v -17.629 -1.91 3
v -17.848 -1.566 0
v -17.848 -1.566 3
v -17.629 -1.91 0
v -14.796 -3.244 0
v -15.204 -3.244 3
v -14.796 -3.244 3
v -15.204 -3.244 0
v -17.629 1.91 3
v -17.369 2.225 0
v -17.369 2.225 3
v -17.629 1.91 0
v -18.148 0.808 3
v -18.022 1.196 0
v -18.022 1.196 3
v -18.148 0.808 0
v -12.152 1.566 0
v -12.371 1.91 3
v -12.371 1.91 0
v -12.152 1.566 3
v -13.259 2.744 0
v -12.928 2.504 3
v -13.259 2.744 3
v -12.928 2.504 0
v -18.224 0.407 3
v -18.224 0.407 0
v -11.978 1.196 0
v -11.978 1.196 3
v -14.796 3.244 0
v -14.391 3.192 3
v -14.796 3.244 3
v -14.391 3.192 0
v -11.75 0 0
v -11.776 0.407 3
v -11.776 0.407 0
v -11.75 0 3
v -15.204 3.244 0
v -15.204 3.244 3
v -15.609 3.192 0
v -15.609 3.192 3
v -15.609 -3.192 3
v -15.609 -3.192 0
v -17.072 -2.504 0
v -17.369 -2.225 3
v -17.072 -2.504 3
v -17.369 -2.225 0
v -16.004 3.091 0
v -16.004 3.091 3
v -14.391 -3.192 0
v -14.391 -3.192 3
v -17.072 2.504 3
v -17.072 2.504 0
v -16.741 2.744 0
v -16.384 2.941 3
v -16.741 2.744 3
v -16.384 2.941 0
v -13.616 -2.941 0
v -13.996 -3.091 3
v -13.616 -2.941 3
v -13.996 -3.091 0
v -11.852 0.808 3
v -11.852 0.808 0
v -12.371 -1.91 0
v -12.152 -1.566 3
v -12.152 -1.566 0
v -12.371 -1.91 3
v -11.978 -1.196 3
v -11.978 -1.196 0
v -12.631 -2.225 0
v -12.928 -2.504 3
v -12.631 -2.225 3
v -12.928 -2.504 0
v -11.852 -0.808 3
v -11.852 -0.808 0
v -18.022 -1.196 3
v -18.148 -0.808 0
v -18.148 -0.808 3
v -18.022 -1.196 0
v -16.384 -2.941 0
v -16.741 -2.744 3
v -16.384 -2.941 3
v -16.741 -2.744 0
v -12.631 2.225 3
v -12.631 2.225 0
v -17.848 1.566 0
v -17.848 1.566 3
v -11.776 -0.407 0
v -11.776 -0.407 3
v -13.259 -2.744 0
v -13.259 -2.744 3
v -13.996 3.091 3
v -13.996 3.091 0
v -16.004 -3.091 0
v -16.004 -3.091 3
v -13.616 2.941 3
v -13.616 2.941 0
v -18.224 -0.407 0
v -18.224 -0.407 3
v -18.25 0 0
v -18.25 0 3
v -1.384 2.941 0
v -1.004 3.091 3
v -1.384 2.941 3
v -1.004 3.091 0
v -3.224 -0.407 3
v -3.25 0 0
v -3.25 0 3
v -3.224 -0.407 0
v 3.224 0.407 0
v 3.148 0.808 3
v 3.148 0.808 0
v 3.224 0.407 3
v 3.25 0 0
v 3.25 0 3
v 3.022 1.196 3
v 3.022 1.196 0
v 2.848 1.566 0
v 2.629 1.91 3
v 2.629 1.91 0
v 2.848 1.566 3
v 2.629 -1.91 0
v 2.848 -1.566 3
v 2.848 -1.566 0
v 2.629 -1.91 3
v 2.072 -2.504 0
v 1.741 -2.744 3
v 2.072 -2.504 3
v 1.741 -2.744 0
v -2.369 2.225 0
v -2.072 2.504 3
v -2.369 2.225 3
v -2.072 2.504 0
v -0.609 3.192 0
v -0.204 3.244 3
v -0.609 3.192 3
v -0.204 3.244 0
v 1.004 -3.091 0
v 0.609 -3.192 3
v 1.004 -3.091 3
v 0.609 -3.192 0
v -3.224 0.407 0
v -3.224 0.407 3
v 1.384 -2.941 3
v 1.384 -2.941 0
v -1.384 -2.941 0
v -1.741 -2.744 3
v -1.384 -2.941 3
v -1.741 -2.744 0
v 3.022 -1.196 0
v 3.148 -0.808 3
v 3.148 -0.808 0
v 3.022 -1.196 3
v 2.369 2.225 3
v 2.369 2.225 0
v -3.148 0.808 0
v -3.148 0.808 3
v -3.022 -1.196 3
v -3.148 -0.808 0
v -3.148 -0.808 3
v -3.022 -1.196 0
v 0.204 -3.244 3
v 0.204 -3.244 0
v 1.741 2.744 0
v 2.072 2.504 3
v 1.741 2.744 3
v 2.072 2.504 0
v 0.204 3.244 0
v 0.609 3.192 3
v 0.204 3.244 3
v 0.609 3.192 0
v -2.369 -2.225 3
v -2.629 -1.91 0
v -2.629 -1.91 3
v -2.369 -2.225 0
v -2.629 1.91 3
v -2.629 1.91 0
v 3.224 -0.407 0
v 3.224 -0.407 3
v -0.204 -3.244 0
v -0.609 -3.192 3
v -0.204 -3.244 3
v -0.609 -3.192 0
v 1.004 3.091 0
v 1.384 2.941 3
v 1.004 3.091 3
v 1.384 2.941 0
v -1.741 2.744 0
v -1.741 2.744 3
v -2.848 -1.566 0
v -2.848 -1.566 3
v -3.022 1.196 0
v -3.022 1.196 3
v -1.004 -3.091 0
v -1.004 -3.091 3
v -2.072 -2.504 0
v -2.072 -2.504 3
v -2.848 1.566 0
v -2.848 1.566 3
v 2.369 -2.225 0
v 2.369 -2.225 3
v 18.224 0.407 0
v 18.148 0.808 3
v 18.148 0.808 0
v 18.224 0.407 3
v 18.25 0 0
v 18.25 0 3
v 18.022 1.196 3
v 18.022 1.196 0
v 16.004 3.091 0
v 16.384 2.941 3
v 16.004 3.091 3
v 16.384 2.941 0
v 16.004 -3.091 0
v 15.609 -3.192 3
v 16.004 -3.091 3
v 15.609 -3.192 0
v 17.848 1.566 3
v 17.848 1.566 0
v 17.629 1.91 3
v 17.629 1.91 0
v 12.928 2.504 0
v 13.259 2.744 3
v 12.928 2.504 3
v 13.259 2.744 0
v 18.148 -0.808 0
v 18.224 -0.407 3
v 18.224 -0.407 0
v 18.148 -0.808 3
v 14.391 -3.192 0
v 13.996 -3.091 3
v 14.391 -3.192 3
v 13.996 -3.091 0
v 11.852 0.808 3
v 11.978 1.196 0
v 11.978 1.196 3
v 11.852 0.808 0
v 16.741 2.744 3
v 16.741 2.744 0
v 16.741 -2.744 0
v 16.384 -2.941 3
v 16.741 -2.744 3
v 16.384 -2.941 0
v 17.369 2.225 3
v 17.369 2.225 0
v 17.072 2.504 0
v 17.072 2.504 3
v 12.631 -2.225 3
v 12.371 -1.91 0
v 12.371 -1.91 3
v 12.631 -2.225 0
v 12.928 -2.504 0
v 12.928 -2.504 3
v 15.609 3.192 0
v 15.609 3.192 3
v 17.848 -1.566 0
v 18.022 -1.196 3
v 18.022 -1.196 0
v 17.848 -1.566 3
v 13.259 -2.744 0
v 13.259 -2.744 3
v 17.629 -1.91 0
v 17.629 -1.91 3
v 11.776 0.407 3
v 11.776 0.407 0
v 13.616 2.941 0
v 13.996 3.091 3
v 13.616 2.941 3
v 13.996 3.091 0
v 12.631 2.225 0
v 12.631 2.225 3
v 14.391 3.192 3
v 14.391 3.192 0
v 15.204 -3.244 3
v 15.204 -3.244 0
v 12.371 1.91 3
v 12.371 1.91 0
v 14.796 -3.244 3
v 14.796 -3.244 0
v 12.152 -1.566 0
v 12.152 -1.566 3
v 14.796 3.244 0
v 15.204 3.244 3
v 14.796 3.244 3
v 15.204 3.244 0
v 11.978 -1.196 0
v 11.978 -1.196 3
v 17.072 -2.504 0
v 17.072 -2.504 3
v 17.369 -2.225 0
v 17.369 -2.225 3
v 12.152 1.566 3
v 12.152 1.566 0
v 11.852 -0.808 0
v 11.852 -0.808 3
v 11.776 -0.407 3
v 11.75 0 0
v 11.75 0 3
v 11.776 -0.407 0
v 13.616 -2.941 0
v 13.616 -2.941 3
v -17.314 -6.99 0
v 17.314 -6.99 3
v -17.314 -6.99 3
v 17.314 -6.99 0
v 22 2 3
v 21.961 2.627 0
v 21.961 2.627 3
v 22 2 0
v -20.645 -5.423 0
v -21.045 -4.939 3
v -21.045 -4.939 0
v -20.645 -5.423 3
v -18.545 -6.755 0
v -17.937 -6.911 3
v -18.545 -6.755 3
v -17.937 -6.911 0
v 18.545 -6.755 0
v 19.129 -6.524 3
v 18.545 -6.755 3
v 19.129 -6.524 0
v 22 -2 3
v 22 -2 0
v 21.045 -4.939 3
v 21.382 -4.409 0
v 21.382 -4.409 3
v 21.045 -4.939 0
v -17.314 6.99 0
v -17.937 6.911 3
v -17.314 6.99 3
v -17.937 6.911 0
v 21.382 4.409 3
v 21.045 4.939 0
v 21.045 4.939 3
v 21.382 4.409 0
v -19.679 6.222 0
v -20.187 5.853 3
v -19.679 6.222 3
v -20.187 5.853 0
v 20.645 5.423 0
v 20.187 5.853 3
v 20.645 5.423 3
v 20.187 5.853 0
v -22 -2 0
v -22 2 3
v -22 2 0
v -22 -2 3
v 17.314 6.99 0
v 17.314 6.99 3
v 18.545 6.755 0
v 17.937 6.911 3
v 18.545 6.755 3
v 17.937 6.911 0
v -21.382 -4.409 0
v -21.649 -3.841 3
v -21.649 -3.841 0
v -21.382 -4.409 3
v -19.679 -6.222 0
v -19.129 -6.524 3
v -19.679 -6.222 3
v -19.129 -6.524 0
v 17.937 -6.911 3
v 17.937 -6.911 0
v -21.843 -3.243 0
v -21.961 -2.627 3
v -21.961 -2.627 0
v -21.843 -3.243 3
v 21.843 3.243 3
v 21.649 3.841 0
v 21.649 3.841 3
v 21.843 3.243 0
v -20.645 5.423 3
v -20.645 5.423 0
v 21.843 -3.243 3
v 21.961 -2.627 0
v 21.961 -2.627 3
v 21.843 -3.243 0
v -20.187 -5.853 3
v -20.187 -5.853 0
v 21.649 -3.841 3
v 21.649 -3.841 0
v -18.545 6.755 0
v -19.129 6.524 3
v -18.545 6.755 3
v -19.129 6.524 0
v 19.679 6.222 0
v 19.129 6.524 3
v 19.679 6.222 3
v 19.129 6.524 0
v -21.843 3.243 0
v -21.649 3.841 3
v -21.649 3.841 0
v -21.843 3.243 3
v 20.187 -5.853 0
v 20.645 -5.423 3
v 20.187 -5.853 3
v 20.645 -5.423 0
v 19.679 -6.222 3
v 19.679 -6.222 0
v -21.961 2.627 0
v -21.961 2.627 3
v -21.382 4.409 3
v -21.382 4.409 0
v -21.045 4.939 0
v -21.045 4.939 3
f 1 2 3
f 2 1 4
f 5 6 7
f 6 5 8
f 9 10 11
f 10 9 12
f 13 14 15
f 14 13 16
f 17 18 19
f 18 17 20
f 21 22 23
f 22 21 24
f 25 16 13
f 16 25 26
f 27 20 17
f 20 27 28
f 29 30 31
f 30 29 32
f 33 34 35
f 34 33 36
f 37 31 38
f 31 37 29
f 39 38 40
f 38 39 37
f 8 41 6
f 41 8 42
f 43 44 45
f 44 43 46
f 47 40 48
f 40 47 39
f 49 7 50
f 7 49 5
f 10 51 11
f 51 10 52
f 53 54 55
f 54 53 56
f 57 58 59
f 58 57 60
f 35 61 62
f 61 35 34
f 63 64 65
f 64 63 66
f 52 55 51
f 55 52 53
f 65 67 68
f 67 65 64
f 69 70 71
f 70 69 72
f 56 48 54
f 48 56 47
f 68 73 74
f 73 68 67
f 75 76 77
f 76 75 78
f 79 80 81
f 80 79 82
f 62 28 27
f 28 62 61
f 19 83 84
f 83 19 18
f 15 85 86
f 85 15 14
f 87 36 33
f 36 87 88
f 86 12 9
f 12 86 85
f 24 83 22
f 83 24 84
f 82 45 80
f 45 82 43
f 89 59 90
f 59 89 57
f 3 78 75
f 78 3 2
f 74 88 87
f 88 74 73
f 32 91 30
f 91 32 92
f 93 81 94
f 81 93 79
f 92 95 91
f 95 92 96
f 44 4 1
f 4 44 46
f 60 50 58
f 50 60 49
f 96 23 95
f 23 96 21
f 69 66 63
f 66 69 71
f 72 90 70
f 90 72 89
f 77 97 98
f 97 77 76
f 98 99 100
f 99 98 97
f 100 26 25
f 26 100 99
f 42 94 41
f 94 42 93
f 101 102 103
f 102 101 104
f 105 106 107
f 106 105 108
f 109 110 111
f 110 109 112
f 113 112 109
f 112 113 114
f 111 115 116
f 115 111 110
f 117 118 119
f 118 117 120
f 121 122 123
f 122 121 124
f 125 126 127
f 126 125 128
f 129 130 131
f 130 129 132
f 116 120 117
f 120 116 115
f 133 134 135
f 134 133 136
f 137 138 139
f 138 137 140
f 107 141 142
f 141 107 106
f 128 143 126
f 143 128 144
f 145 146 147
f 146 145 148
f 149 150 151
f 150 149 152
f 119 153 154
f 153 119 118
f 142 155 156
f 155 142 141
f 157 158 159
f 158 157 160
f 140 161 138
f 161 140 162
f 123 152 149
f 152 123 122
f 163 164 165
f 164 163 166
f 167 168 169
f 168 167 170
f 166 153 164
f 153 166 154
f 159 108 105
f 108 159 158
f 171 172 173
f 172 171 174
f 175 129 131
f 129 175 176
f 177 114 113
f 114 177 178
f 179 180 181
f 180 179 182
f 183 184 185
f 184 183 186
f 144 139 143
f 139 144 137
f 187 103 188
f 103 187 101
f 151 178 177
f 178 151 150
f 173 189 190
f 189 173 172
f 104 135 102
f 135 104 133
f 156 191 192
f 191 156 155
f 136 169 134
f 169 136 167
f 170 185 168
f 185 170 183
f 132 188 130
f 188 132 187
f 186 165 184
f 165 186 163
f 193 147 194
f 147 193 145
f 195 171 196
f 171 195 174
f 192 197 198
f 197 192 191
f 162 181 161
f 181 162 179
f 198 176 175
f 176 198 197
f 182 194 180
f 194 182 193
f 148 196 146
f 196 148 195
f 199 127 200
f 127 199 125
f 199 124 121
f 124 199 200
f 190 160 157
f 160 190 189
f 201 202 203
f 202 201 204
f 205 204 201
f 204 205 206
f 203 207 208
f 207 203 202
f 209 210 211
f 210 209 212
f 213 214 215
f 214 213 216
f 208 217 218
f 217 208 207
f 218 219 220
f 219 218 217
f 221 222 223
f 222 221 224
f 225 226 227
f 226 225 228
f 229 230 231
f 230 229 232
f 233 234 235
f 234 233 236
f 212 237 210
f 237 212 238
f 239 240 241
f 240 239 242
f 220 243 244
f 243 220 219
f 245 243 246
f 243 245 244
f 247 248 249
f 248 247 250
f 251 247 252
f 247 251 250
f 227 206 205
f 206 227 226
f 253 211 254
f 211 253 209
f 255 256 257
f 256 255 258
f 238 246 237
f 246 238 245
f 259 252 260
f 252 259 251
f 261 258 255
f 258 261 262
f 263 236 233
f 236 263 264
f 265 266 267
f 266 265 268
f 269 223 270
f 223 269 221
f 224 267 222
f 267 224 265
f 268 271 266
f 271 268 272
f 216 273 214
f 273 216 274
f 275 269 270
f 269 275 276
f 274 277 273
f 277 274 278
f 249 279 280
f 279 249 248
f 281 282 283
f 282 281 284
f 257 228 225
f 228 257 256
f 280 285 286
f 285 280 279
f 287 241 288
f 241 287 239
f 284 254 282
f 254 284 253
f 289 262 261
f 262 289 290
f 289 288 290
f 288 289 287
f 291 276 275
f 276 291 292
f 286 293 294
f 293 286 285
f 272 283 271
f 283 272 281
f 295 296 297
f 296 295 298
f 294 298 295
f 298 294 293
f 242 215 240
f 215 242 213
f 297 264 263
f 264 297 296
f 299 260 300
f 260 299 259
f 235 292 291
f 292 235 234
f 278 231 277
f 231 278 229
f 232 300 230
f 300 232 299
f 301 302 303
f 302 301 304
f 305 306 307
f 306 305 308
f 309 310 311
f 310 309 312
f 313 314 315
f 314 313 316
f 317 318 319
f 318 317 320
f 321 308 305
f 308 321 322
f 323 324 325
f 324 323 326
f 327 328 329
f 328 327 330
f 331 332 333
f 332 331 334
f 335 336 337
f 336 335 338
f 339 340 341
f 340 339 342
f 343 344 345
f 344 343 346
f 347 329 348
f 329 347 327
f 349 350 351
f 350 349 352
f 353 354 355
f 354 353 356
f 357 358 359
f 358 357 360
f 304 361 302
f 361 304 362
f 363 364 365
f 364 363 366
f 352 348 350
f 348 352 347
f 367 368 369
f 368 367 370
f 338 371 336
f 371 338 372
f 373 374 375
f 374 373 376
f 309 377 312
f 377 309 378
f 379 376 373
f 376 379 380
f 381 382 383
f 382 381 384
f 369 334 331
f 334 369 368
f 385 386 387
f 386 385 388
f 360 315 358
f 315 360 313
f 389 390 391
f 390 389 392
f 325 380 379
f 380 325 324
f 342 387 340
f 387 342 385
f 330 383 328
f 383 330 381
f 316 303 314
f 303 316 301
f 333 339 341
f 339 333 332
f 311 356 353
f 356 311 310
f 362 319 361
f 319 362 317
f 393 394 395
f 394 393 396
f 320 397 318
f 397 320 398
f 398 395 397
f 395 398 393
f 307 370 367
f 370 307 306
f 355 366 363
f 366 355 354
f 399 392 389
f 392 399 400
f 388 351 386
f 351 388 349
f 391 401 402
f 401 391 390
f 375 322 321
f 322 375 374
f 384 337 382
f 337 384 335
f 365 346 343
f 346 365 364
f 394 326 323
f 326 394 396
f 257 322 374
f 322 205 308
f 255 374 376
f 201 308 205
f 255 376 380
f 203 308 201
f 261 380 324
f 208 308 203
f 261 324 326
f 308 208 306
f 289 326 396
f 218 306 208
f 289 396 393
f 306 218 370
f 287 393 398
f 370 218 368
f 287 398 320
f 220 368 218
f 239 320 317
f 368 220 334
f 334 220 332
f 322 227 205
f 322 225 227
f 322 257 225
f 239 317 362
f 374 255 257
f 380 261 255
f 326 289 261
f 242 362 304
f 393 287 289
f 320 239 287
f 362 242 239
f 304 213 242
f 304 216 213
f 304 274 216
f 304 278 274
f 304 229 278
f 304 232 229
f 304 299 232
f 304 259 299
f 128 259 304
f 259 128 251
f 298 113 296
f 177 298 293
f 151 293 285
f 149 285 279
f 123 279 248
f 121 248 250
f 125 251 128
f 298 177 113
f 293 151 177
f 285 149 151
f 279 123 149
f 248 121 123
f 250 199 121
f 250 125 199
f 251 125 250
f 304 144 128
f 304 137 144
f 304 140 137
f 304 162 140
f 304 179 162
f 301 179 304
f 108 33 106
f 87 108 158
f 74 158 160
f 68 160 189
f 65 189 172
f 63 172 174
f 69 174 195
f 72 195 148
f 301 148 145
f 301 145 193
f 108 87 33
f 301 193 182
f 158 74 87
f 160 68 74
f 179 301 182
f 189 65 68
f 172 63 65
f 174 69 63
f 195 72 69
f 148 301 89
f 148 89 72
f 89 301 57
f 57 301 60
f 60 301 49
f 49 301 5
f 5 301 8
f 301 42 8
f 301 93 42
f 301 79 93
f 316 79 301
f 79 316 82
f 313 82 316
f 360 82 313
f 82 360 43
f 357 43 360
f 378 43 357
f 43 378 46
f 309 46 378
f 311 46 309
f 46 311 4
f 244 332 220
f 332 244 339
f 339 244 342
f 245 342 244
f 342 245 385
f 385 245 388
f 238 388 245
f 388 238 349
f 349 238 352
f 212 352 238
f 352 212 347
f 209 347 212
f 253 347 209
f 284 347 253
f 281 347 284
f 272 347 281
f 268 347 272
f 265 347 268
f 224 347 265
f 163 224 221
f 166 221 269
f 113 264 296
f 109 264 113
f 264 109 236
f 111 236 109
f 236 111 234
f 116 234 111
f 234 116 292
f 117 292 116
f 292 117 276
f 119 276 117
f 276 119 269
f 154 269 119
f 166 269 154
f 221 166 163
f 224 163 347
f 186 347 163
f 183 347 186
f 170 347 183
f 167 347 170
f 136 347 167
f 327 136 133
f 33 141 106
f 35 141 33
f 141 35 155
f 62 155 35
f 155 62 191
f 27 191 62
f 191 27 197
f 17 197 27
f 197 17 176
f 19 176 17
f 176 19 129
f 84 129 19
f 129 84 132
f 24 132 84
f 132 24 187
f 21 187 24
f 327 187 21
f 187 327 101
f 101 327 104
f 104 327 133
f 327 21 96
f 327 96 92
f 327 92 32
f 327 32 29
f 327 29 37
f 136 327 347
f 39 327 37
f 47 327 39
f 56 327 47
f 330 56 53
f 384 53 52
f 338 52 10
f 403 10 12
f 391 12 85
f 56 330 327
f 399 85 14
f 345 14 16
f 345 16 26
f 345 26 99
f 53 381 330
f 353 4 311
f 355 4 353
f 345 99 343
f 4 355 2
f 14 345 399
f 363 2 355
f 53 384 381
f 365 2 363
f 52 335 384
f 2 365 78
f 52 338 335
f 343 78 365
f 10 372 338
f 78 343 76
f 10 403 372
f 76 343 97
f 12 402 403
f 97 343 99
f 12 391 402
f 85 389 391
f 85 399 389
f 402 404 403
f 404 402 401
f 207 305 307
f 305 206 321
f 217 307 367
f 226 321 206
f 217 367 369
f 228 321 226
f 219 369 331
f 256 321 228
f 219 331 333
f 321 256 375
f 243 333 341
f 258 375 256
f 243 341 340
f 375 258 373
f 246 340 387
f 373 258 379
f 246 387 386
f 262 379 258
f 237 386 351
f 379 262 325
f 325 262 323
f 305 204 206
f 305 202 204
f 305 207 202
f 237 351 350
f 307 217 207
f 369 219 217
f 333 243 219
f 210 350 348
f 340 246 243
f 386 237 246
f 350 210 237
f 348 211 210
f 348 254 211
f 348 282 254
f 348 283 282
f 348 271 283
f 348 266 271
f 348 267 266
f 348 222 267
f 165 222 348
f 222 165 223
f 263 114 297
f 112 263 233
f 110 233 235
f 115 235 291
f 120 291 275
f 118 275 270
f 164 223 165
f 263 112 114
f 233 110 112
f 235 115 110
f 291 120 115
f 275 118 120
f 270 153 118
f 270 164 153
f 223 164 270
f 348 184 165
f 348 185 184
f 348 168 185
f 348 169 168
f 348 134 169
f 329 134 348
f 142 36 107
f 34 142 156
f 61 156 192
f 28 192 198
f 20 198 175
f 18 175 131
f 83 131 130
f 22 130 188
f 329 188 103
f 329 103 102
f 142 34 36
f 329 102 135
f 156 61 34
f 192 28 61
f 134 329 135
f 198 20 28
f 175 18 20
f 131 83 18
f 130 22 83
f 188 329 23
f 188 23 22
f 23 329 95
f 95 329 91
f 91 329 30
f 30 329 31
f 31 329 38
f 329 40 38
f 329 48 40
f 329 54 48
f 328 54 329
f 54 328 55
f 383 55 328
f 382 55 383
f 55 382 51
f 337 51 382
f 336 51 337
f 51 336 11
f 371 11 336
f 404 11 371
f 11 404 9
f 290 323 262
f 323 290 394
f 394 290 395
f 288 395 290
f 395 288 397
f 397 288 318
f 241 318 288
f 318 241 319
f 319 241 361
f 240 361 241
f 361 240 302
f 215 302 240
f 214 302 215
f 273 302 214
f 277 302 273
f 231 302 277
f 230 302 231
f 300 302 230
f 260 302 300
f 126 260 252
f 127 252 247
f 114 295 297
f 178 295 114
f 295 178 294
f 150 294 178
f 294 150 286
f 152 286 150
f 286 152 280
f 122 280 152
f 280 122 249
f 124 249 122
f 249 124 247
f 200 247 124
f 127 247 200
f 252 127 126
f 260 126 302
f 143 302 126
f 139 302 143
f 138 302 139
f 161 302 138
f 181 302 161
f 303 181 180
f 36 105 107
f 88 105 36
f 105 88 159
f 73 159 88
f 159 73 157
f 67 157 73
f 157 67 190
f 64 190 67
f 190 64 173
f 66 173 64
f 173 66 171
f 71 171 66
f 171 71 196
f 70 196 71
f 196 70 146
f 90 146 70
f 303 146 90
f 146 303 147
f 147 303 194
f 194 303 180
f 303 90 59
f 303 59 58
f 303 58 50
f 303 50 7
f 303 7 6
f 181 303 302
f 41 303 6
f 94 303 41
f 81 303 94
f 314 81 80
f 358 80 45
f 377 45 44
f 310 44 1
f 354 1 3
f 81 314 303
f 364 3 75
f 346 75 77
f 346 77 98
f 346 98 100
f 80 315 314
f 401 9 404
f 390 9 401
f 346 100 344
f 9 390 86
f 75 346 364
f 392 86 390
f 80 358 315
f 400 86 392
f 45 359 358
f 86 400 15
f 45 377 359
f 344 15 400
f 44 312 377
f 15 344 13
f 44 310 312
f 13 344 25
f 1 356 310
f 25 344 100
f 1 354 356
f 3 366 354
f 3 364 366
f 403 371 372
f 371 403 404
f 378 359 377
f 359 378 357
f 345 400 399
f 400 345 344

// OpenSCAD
$fn = 50;


difference() {
	union() {
		hull() {
			translate(v = [-17.0000000000, 2.0000000000, 0]) {
				cylinder(h = 3, r = 5);
			}
			translate(v = [17.0000000000, 2.0000000000, 0]) {
				cylinder(h = 3, r = 5);
			}
			translate(v = [-17.0000000000, -2.0000000000, 0]) {
				cylinder(h = 3, r = 5);
			}
			translate(v = [17.0000000000, -2.0000000000, 0]) {
				cylinder(h = 3, r = 5);
			}
		}
	}
	union() {
		translate(v = [-15.0000000000, 0.0000000000, -100.0000000000]) {
			cylinder(h = 200, r = 3.2500000000);
		}
		translate(v = [0.0000000000, 0.0000000000, -100.0000000000]) {
			cylinder(h = 200, r = 3.2500000000);
		}
		translate(v = [15.0000000000, 0.0000000000, -100.0000000000]) {
			cylinder(h = 200, r = 3.2500000000);
		}
	}
}
